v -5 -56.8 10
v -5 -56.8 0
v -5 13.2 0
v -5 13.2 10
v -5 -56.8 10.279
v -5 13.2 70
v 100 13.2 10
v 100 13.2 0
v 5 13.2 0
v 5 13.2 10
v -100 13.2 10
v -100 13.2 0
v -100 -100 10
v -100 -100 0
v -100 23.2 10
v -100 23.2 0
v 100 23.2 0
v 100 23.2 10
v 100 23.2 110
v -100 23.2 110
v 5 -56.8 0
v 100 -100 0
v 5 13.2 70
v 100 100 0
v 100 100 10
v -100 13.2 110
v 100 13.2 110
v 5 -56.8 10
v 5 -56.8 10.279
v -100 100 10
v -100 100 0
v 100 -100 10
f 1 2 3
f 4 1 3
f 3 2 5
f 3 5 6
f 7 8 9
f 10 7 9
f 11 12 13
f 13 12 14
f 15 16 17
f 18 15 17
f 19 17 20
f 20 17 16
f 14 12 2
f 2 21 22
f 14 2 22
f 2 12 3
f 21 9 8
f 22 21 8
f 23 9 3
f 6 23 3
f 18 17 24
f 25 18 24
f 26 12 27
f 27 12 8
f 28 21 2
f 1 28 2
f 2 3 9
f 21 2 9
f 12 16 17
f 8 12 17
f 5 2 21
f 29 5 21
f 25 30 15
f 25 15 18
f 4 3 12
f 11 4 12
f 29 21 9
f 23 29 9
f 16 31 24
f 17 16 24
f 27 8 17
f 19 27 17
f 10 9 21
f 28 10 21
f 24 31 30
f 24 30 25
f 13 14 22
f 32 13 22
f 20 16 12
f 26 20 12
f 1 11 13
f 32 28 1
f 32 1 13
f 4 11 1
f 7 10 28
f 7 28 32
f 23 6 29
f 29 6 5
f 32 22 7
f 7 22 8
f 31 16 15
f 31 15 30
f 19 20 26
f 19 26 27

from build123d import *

# Parameters (mm, degrees)
F0_W     = 200
F0_H     = 76.8
F1_DEPTH = 10
F2_DEPTH = 110
F0_W_2   = 5
F0_H_2   = 70
F3_DEPTH = 70
F5_DEPTH = 100


with BuildPart() as f1:
    # F0 (on Top) → F1 (new body)
    with BuildSketch(Plane.XY):
        with Locations((0, 61.6)):
            Rectangle(F0_W, F0_H)
        Polygon((-20.44335, 13.2), (-100, 13.2), (-100, -100), (100, -100), (100, 13.2), (25.435627, 13.2), (5, 13.2), (5, -56.8), (0, -56.8), (-5, -56.8), (-5, 13.2), align=None)
    extrude(amount=F1_DEPTH)


with BuildPart() as f2:
    # F0 (on Top) → F2 (new body)
    with BuildSketch(Plane.XY):
        Polygon((100, 23.2), (-100, 23.2), (-100, 13.2), (-20.44335, 13.2), (-5, 13.2), (0, 13.2), (5, 13.2), (25.435627, 13.2), (100, 13.2), align=None)
    extrude(amount=F2_DEPTH)


with BuildPart() as f3:
    # F0 (on Top) → F3 (new body)
    with BuildSketch(Plane.XY):
        with Locations((2.5, -21.8)):
            Rectangle(F0_W_2, F0_H_2)
        with Locations((-2.5, -21.8)):
            Rectangle(F0_W_2, F0_H_2)
    extrude(amount=F3_DEPTH)

    # F4 (on face) → F5 (cut)
    with BuildSketch(Plane(origin=(-5, 0, 0), x_dir=(0, -1, 0), z_dir=(-1, 0, 0))):
        Polygon((56.8, 70), (-13.2, 70), (56.8, 10.27856), align=None)
    extrude(amount=-F5_DEPTH, mode=Mode.SUBTRACT)


solid = Compound([f1.part, f2.part, f3.part])
